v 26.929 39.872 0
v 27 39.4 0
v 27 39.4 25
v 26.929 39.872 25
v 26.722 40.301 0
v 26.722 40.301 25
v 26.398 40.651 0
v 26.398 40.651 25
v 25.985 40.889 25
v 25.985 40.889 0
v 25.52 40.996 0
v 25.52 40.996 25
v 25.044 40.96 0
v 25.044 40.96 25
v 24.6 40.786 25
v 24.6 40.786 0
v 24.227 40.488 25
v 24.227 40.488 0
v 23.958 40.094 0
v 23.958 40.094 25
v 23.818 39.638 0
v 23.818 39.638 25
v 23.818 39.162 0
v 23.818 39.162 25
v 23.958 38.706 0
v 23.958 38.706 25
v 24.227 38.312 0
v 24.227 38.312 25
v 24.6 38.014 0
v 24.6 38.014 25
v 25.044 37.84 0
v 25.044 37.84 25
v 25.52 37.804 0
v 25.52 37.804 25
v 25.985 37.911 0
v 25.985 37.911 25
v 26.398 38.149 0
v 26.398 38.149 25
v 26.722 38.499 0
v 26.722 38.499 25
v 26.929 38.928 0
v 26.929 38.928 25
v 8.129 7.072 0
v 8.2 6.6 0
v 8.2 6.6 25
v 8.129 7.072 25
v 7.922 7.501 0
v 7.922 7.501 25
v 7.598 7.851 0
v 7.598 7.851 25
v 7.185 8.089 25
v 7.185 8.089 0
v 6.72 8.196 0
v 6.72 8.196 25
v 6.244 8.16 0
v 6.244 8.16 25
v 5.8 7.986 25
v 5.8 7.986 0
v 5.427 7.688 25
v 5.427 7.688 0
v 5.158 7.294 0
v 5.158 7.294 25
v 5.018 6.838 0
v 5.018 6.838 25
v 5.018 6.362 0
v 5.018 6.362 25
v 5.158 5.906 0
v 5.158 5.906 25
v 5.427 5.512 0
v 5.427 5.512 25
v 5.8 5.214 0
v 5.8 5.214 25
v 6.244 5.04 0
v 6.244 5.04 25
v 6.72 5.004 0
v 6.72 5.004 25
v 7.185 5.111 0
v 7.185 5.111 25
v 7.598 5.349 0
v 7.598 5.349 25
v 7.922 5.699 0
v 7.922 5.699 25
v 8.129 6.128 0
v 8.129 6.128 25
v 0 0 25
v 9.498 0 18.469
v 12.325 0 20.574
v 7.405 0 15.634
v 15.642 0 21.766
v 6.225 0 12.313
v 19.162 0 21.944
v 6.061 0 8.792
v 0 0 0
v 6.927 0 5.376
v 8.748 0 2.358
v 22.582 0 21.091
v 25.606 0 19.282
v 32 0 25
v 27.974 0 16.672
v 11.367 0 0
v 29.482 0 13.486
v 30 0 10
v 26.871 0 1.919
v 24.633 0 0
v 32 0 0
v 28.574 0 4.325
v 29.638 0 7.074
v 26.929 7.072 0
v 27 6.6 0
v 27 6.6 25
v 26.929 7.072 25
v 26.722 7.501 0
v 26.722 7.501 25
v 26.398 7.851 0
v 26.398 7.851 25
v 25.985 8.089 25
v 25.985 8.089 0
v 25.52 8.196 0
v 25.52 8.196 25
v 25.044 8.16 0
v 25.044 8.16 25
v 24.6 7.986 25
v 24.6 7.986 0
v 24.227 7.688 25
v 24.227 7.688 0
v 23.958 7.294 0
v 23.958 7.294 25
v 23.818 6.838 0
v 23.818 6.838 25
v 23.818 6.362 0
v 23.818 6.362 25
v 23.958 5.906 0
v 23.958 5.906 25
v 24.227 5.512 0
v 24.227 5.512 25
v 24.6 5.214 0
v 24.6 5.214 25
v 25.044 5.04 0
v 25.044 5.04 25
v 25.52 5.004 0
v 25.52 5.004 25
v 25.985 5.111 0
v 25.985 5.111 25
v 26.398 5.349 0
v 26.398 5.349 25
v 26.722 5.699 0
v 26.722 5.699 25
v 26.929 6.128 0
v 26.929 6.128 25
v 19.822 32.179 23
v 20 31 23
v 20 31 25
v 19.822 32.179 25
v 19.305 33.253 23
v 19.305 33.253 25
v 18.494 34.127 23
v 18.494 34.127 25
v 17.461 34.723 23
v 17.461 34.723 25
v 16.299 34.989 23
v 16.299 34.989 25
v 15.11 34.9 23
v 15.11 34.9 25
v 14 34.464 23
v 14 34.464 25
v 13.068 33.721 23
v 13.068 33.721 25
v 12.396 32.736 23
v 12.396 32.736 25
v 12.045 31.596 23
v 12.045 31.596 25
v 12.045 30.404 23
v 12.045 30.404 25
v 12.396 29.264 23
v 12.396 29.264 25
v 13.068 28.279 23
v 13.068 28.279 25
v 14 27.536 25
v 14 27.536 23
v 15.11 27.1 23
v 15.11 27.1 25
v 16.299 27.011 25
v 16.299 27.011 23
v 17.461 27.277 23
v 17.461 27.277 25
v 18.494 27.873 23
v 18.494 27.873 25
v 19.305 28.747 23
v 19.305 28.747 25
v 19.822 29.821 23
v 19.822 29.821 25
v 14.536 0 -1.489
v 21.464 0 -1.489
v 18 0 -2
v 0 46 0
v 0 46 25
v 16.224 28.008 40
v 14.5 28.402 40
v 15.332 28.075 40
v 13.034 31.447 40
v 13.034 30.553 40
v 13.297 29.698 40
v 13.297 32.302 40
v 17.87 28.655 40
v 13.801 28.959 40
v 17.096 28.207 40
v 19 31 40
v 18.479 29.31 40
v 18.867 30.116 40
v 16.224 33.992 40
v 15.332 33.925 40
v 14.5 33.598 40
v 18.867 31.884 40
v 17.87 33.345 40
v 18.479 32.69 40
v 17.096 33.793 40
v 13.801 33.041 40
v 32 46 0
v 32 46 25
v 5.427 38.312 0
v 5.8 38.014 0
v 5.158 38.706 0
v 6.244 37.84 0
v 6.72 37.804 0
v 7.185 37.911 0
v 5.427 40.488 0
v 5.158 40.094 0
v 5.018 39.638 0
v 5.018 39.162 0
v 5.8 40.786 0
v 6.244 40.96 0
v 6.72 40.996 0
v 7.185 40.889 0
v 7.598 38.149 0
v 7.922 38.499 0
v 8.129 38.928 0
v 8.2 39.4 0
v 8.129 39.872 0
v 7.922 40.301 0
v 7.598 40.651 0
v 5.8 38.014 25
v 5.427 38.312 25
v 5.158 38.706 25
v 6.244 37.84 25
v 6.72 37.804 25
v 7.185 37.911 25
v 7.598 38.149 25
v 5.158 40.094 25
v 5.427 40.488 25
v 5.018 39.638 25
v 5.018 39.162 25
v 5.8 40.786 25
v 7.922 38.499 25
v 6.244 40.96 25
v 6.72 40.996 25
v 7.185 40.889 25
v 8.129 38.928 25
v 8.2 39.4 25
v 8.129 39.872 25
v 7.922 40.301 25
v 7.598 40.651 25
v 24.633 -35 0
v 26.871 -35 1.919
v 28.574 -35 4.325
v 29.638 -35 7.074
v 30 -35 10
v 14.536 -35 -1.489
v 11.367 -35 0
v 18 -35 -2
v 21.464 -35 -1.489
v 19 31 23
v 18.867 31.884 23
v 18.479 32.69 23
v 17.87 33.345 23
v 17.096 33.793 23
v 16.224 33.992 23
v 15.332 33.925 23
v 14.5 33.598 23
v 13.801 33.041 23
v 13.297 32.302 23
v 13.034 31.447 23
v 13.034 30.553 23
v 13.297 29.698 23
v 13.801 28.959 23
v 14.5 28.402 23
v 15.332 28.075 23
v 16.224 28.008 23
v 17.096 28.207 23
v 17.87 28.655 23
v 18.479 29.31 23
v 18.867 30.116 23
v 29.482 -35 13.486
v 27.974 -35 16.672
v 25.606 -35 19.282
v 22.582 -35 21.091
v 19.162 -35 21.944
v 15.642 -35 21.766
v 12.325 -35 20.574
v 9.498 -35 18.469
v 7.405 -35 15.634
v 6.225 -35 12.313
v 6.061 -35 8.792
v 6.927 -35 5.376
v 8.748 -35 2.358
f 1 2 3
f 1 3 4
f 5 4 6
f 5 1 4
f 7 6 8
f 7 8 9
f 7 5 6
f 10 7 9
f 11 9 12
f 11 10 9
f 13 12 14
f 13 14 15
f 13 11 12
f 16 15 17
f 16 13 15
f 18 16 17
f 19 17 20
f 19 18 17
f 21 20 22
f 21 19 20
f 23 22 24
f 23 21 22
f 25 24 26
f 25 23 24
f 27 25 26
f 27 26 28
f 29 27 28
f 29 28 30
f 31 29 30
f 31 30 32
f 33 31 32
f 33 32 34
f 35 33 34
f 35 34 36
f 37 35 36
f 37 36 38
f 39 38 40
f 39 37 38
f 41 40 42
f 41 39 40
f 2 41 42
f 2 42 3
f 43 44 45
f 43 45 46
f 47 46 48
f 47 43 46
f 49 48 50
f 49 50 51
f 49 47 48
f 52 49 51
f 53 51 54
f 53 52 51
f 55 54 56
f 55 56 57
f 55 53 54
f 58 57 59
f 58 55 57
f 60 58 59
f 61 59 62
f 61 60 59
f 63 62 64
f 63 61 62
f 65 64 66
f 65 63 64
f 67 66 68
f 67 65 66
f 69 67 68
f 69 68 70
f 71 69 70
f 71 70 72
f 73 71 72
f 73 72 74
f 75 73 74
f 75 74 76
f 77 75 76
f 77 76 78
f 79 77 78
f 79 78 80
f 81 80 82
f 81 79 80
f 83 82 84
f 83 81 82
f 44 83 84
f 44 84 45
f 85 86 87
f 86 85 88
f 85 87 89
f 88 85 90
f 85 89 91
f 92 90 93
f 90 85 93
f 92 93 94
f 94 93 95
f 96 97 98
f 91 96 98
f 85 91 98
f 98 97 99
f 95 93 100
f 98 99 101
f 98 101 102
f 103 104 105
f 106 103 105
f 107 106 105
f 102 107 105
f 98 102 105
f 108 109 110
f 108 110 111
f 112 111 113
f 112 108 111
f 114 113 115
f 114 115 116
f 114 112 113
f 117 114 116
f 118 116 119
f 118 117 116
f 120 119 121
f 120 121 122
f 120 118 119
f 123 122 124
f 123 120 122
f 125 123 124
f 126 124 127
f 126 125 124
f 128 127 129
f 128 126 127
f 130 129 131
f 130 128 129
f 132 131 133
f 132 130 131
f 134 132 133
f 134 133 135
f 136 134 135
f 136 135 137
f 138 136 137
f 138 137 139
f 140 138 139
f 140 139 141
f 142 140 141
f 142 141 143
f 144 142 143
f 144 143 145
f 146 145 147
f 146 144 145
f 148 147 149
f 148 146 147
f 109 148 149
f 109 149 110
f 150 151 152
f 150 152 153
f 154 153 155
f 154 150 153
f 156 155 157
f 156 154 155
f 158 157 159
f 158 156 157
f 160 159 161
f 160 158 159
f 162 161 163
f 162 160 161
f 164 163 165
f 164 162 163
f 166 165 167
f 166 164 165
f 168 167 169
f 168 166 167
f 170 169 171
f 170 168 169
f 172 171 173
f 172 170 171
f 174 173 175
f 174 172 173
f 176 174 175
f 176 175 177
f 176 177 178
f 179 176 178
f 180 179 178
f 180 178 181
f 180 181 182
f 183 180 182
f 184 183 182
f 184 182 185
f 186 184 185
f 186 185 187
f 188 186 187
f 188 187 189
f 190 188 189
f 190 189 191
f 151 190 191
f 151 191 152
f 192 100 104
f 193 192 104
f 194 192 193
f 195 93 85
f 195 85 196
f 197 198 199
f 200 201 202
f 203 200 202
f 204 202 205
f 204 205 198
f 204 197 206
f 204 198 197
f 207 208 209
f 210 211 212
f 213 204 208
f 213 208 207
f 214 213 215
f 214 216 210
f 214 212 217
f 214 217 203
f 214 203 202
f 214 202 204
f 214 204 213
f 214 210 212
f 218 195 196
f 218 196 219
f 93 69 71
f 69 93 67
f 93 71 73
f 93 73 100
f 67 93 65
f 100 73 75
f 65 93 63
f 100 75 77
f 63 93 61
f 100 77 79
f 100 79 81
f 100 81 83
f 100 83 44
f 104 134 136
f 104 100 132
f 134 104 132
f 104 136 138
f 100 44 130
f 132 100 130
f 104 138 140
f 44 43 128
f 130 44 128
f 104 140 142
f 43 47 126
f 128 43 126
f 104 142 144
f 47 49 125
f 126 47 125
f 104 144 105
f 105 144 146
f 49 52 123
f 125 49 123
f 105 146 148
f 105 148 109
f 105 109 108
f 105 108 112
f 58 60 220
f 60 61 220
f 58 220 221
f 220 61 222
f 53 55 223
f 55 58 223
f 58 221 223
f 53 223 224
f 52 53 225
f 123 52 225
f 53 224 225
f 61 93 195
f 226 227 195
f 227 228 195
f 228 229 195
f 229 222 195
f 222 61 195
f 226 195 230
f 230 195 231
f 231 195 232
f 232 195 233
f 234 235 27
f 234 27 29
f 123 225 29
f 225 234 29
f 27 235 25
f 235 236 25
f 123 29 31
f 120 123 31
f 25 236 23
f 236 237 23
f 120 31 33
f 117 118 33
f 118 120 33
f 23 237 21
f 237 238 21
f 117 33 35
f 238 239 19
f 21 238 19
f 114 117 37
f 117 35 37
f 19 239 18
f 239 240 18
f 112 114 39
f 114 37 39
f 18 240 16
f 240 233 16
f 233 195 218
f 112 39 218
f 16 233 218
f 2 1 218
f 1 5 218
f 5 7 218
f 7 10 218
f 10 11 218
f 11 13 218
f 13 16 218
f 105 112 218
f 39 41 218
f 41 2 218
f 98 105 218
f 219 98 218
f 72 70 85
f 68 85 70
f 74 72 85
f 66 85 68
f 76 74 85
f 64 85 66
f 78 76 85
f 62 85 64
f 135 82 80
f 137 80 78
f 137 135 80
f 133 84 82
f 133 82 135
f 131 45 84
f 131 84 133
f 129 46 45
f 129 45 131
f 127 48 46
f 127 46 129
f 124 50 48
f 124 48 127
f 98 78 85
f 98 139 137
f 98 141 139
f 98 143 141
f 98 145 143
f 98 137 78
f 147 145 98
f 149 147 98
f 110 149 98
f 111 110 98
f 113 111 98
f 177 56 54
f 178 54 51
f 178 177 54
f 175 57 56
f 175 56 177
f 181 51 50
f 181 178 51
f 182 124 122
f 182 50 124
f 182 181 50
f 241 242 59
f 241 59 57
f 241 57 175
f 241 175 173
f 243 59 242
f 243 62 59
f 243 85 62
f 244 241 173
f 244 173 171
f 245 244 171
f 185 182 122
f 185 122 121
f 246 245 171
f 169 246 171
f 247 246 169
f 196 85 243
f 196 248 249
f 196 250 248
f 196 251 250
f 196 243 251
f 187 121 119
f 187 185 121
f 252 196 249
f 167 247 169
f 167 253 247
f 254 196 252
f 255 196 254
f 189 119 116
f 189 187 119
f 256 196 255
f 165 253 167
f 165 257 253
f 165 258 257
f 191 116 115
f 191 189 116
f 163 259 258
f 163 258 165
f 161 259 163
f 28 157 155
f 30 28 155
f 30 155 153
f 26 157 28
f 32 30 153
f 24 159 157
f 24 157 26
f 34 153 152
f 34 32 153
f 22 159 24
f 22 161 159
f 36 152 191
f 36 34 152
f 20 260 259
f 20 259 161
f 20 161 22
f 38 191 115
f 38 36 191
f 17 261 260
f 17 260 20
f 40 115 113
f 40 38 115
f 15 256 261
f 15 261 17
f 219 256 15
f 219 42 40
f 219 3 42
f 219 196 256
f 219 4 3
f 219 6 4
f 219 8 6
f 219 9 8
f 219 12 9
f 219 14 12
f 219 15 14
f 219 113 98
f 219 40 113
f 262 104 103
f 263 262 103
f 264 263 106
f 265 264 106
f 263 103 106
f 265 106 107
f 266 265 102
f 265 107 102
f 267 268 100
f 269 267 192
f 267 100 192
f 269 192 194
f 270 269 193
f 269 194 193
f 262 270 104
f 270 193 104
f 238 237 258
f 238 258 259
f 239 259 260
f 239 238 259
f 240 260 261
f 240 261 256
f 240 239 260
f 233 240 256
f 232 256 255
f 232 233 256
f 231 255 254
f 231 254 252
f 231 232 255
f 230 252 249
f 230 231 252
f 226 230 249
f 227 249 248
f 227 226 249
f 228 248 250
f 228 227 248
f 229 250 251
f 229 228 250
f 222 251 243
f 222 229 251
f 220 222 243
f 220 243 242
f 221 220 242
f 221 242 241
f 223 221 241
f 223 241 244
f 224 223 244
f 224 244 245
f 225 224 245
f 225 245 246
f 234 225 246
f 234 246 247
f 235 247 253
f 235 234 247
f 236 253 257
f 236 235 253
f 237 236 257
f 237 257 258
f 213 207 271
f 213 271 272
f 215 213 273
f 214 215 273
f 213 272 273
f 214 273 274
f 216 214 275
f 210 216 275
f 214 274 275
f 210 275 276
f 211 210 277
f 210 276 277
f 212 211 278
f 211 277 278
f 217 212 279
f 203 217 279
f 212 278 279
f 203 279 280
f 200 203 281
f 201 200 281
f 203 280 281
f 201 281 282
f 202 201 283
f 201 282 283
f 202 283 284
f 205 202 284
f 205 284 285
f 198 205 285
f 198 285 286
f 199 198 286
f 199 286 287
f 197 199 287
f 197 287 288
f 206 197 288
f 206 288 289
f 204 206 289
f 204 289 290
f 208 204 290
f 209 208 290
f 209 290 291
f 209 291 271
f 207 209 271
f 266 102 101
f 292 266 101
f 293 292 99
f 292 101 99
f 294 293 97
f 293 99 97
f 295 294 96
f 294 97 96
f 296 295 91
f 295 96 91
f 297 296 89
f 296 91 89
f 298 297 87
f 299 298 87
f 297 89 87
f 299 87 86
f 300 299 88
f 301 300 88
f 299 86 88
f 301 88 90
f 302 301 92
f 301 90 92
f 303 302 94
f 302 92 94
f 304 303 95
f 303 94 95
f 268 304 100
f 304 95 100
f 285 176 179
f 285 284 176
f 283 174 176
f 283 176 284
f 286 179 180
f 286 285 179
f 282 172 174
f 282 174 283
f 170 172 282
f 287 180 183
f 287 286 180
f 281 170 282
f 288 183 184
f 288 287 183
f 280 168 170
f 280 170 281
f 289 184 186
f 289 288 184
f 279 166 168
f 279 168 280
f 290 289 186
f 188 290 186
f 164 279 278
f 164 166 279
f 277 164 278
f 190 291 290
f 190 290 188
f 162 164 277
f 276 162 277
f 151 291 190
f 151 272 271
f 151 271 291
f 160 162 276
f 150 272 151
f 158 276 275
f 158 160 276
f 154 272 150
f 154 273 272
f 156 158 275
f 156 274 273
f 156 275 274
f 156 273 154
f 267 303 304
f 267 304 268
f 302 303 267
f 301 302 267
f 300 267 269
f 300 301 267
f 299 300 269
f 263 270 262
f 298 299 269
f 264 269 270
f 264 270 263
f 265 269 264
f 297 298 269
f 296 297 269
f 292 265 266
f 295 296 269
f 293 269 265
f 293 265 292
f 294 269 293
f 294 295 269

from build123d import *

# Parameters (mm, degrees)
F0_W     = 32
F0_H     = 46
F0_R     = 1.6
F0_R_2   = 4
F1_DEPTH = 25
F3_DEPTH = 35
F0_R_3   = 3
F4_DEPTH = 23
F5_DEPTH = 40


with BuildPart() as f1:
    # F0 (on Top) → F1 (new body)
    with BuildSketch(Plane.XY):
        with Locations((16, 23)):
            Rectangle(F0_W, F0_H)
        with Locations((6.6, 6.6)):
            Circle(F0_R, mode=Mode.SUBTRACT)
        with Locations((25.4, 6.6)):
            Circle(F0_R, mode=Mode.SUBTRACT)
        with Locations((6.6, 39.4)):
            Circle(F0_R, mode=Mode.SUBTRACT)
        with Locations((16, 31)):
            Circle(F0_R_2, mode=Mode.SUBTRACT)
        with Locations((25.4, 39.4)):
            Circle(F0_R, mode=Mode.SUBTRACT)
    extrude(amount=F1_DEPTH)

    # F2 (on face) → F3 (join)
    with BuildSketch(Plane.XZ):
        with BuildLine():
            ThreePointArc((24.63325, 0), (28.573528, 4.325451), (30, 10))
            ThreePointArc((30, 10), (12.325451, 20.573528), (11.36675, 0))
            Line((11.36675, 0), (24.63325, 0))
        make_face()
        with BuildLine():
            Line((24.63325, 0), (11.36675, 0))
            ThreePointArc((11.36675, 0), (18, -2), (24.63325, 0))
        make_face()
    extrude(amount=F3_DEPTH)

    # F0 (on Top) → F4 (join)
    with BuildSketch(Plane.XY):
        with Locations((16, 31)):
            Circle(F0_R_2)
        with Locations((16, 31)):
            Circle(F0_R_3, mode=Mode.SUBTRACT)
    extrude(amount=F4_DEPTH)

    # F0 (on Top) → F5 (join)
    with BuildSketch(Plane.XY):
        with Locations((16, 31)):
            Circle(F0_R_3)
    extrude(amount=F5_DEPTH)


solid = f1.part
